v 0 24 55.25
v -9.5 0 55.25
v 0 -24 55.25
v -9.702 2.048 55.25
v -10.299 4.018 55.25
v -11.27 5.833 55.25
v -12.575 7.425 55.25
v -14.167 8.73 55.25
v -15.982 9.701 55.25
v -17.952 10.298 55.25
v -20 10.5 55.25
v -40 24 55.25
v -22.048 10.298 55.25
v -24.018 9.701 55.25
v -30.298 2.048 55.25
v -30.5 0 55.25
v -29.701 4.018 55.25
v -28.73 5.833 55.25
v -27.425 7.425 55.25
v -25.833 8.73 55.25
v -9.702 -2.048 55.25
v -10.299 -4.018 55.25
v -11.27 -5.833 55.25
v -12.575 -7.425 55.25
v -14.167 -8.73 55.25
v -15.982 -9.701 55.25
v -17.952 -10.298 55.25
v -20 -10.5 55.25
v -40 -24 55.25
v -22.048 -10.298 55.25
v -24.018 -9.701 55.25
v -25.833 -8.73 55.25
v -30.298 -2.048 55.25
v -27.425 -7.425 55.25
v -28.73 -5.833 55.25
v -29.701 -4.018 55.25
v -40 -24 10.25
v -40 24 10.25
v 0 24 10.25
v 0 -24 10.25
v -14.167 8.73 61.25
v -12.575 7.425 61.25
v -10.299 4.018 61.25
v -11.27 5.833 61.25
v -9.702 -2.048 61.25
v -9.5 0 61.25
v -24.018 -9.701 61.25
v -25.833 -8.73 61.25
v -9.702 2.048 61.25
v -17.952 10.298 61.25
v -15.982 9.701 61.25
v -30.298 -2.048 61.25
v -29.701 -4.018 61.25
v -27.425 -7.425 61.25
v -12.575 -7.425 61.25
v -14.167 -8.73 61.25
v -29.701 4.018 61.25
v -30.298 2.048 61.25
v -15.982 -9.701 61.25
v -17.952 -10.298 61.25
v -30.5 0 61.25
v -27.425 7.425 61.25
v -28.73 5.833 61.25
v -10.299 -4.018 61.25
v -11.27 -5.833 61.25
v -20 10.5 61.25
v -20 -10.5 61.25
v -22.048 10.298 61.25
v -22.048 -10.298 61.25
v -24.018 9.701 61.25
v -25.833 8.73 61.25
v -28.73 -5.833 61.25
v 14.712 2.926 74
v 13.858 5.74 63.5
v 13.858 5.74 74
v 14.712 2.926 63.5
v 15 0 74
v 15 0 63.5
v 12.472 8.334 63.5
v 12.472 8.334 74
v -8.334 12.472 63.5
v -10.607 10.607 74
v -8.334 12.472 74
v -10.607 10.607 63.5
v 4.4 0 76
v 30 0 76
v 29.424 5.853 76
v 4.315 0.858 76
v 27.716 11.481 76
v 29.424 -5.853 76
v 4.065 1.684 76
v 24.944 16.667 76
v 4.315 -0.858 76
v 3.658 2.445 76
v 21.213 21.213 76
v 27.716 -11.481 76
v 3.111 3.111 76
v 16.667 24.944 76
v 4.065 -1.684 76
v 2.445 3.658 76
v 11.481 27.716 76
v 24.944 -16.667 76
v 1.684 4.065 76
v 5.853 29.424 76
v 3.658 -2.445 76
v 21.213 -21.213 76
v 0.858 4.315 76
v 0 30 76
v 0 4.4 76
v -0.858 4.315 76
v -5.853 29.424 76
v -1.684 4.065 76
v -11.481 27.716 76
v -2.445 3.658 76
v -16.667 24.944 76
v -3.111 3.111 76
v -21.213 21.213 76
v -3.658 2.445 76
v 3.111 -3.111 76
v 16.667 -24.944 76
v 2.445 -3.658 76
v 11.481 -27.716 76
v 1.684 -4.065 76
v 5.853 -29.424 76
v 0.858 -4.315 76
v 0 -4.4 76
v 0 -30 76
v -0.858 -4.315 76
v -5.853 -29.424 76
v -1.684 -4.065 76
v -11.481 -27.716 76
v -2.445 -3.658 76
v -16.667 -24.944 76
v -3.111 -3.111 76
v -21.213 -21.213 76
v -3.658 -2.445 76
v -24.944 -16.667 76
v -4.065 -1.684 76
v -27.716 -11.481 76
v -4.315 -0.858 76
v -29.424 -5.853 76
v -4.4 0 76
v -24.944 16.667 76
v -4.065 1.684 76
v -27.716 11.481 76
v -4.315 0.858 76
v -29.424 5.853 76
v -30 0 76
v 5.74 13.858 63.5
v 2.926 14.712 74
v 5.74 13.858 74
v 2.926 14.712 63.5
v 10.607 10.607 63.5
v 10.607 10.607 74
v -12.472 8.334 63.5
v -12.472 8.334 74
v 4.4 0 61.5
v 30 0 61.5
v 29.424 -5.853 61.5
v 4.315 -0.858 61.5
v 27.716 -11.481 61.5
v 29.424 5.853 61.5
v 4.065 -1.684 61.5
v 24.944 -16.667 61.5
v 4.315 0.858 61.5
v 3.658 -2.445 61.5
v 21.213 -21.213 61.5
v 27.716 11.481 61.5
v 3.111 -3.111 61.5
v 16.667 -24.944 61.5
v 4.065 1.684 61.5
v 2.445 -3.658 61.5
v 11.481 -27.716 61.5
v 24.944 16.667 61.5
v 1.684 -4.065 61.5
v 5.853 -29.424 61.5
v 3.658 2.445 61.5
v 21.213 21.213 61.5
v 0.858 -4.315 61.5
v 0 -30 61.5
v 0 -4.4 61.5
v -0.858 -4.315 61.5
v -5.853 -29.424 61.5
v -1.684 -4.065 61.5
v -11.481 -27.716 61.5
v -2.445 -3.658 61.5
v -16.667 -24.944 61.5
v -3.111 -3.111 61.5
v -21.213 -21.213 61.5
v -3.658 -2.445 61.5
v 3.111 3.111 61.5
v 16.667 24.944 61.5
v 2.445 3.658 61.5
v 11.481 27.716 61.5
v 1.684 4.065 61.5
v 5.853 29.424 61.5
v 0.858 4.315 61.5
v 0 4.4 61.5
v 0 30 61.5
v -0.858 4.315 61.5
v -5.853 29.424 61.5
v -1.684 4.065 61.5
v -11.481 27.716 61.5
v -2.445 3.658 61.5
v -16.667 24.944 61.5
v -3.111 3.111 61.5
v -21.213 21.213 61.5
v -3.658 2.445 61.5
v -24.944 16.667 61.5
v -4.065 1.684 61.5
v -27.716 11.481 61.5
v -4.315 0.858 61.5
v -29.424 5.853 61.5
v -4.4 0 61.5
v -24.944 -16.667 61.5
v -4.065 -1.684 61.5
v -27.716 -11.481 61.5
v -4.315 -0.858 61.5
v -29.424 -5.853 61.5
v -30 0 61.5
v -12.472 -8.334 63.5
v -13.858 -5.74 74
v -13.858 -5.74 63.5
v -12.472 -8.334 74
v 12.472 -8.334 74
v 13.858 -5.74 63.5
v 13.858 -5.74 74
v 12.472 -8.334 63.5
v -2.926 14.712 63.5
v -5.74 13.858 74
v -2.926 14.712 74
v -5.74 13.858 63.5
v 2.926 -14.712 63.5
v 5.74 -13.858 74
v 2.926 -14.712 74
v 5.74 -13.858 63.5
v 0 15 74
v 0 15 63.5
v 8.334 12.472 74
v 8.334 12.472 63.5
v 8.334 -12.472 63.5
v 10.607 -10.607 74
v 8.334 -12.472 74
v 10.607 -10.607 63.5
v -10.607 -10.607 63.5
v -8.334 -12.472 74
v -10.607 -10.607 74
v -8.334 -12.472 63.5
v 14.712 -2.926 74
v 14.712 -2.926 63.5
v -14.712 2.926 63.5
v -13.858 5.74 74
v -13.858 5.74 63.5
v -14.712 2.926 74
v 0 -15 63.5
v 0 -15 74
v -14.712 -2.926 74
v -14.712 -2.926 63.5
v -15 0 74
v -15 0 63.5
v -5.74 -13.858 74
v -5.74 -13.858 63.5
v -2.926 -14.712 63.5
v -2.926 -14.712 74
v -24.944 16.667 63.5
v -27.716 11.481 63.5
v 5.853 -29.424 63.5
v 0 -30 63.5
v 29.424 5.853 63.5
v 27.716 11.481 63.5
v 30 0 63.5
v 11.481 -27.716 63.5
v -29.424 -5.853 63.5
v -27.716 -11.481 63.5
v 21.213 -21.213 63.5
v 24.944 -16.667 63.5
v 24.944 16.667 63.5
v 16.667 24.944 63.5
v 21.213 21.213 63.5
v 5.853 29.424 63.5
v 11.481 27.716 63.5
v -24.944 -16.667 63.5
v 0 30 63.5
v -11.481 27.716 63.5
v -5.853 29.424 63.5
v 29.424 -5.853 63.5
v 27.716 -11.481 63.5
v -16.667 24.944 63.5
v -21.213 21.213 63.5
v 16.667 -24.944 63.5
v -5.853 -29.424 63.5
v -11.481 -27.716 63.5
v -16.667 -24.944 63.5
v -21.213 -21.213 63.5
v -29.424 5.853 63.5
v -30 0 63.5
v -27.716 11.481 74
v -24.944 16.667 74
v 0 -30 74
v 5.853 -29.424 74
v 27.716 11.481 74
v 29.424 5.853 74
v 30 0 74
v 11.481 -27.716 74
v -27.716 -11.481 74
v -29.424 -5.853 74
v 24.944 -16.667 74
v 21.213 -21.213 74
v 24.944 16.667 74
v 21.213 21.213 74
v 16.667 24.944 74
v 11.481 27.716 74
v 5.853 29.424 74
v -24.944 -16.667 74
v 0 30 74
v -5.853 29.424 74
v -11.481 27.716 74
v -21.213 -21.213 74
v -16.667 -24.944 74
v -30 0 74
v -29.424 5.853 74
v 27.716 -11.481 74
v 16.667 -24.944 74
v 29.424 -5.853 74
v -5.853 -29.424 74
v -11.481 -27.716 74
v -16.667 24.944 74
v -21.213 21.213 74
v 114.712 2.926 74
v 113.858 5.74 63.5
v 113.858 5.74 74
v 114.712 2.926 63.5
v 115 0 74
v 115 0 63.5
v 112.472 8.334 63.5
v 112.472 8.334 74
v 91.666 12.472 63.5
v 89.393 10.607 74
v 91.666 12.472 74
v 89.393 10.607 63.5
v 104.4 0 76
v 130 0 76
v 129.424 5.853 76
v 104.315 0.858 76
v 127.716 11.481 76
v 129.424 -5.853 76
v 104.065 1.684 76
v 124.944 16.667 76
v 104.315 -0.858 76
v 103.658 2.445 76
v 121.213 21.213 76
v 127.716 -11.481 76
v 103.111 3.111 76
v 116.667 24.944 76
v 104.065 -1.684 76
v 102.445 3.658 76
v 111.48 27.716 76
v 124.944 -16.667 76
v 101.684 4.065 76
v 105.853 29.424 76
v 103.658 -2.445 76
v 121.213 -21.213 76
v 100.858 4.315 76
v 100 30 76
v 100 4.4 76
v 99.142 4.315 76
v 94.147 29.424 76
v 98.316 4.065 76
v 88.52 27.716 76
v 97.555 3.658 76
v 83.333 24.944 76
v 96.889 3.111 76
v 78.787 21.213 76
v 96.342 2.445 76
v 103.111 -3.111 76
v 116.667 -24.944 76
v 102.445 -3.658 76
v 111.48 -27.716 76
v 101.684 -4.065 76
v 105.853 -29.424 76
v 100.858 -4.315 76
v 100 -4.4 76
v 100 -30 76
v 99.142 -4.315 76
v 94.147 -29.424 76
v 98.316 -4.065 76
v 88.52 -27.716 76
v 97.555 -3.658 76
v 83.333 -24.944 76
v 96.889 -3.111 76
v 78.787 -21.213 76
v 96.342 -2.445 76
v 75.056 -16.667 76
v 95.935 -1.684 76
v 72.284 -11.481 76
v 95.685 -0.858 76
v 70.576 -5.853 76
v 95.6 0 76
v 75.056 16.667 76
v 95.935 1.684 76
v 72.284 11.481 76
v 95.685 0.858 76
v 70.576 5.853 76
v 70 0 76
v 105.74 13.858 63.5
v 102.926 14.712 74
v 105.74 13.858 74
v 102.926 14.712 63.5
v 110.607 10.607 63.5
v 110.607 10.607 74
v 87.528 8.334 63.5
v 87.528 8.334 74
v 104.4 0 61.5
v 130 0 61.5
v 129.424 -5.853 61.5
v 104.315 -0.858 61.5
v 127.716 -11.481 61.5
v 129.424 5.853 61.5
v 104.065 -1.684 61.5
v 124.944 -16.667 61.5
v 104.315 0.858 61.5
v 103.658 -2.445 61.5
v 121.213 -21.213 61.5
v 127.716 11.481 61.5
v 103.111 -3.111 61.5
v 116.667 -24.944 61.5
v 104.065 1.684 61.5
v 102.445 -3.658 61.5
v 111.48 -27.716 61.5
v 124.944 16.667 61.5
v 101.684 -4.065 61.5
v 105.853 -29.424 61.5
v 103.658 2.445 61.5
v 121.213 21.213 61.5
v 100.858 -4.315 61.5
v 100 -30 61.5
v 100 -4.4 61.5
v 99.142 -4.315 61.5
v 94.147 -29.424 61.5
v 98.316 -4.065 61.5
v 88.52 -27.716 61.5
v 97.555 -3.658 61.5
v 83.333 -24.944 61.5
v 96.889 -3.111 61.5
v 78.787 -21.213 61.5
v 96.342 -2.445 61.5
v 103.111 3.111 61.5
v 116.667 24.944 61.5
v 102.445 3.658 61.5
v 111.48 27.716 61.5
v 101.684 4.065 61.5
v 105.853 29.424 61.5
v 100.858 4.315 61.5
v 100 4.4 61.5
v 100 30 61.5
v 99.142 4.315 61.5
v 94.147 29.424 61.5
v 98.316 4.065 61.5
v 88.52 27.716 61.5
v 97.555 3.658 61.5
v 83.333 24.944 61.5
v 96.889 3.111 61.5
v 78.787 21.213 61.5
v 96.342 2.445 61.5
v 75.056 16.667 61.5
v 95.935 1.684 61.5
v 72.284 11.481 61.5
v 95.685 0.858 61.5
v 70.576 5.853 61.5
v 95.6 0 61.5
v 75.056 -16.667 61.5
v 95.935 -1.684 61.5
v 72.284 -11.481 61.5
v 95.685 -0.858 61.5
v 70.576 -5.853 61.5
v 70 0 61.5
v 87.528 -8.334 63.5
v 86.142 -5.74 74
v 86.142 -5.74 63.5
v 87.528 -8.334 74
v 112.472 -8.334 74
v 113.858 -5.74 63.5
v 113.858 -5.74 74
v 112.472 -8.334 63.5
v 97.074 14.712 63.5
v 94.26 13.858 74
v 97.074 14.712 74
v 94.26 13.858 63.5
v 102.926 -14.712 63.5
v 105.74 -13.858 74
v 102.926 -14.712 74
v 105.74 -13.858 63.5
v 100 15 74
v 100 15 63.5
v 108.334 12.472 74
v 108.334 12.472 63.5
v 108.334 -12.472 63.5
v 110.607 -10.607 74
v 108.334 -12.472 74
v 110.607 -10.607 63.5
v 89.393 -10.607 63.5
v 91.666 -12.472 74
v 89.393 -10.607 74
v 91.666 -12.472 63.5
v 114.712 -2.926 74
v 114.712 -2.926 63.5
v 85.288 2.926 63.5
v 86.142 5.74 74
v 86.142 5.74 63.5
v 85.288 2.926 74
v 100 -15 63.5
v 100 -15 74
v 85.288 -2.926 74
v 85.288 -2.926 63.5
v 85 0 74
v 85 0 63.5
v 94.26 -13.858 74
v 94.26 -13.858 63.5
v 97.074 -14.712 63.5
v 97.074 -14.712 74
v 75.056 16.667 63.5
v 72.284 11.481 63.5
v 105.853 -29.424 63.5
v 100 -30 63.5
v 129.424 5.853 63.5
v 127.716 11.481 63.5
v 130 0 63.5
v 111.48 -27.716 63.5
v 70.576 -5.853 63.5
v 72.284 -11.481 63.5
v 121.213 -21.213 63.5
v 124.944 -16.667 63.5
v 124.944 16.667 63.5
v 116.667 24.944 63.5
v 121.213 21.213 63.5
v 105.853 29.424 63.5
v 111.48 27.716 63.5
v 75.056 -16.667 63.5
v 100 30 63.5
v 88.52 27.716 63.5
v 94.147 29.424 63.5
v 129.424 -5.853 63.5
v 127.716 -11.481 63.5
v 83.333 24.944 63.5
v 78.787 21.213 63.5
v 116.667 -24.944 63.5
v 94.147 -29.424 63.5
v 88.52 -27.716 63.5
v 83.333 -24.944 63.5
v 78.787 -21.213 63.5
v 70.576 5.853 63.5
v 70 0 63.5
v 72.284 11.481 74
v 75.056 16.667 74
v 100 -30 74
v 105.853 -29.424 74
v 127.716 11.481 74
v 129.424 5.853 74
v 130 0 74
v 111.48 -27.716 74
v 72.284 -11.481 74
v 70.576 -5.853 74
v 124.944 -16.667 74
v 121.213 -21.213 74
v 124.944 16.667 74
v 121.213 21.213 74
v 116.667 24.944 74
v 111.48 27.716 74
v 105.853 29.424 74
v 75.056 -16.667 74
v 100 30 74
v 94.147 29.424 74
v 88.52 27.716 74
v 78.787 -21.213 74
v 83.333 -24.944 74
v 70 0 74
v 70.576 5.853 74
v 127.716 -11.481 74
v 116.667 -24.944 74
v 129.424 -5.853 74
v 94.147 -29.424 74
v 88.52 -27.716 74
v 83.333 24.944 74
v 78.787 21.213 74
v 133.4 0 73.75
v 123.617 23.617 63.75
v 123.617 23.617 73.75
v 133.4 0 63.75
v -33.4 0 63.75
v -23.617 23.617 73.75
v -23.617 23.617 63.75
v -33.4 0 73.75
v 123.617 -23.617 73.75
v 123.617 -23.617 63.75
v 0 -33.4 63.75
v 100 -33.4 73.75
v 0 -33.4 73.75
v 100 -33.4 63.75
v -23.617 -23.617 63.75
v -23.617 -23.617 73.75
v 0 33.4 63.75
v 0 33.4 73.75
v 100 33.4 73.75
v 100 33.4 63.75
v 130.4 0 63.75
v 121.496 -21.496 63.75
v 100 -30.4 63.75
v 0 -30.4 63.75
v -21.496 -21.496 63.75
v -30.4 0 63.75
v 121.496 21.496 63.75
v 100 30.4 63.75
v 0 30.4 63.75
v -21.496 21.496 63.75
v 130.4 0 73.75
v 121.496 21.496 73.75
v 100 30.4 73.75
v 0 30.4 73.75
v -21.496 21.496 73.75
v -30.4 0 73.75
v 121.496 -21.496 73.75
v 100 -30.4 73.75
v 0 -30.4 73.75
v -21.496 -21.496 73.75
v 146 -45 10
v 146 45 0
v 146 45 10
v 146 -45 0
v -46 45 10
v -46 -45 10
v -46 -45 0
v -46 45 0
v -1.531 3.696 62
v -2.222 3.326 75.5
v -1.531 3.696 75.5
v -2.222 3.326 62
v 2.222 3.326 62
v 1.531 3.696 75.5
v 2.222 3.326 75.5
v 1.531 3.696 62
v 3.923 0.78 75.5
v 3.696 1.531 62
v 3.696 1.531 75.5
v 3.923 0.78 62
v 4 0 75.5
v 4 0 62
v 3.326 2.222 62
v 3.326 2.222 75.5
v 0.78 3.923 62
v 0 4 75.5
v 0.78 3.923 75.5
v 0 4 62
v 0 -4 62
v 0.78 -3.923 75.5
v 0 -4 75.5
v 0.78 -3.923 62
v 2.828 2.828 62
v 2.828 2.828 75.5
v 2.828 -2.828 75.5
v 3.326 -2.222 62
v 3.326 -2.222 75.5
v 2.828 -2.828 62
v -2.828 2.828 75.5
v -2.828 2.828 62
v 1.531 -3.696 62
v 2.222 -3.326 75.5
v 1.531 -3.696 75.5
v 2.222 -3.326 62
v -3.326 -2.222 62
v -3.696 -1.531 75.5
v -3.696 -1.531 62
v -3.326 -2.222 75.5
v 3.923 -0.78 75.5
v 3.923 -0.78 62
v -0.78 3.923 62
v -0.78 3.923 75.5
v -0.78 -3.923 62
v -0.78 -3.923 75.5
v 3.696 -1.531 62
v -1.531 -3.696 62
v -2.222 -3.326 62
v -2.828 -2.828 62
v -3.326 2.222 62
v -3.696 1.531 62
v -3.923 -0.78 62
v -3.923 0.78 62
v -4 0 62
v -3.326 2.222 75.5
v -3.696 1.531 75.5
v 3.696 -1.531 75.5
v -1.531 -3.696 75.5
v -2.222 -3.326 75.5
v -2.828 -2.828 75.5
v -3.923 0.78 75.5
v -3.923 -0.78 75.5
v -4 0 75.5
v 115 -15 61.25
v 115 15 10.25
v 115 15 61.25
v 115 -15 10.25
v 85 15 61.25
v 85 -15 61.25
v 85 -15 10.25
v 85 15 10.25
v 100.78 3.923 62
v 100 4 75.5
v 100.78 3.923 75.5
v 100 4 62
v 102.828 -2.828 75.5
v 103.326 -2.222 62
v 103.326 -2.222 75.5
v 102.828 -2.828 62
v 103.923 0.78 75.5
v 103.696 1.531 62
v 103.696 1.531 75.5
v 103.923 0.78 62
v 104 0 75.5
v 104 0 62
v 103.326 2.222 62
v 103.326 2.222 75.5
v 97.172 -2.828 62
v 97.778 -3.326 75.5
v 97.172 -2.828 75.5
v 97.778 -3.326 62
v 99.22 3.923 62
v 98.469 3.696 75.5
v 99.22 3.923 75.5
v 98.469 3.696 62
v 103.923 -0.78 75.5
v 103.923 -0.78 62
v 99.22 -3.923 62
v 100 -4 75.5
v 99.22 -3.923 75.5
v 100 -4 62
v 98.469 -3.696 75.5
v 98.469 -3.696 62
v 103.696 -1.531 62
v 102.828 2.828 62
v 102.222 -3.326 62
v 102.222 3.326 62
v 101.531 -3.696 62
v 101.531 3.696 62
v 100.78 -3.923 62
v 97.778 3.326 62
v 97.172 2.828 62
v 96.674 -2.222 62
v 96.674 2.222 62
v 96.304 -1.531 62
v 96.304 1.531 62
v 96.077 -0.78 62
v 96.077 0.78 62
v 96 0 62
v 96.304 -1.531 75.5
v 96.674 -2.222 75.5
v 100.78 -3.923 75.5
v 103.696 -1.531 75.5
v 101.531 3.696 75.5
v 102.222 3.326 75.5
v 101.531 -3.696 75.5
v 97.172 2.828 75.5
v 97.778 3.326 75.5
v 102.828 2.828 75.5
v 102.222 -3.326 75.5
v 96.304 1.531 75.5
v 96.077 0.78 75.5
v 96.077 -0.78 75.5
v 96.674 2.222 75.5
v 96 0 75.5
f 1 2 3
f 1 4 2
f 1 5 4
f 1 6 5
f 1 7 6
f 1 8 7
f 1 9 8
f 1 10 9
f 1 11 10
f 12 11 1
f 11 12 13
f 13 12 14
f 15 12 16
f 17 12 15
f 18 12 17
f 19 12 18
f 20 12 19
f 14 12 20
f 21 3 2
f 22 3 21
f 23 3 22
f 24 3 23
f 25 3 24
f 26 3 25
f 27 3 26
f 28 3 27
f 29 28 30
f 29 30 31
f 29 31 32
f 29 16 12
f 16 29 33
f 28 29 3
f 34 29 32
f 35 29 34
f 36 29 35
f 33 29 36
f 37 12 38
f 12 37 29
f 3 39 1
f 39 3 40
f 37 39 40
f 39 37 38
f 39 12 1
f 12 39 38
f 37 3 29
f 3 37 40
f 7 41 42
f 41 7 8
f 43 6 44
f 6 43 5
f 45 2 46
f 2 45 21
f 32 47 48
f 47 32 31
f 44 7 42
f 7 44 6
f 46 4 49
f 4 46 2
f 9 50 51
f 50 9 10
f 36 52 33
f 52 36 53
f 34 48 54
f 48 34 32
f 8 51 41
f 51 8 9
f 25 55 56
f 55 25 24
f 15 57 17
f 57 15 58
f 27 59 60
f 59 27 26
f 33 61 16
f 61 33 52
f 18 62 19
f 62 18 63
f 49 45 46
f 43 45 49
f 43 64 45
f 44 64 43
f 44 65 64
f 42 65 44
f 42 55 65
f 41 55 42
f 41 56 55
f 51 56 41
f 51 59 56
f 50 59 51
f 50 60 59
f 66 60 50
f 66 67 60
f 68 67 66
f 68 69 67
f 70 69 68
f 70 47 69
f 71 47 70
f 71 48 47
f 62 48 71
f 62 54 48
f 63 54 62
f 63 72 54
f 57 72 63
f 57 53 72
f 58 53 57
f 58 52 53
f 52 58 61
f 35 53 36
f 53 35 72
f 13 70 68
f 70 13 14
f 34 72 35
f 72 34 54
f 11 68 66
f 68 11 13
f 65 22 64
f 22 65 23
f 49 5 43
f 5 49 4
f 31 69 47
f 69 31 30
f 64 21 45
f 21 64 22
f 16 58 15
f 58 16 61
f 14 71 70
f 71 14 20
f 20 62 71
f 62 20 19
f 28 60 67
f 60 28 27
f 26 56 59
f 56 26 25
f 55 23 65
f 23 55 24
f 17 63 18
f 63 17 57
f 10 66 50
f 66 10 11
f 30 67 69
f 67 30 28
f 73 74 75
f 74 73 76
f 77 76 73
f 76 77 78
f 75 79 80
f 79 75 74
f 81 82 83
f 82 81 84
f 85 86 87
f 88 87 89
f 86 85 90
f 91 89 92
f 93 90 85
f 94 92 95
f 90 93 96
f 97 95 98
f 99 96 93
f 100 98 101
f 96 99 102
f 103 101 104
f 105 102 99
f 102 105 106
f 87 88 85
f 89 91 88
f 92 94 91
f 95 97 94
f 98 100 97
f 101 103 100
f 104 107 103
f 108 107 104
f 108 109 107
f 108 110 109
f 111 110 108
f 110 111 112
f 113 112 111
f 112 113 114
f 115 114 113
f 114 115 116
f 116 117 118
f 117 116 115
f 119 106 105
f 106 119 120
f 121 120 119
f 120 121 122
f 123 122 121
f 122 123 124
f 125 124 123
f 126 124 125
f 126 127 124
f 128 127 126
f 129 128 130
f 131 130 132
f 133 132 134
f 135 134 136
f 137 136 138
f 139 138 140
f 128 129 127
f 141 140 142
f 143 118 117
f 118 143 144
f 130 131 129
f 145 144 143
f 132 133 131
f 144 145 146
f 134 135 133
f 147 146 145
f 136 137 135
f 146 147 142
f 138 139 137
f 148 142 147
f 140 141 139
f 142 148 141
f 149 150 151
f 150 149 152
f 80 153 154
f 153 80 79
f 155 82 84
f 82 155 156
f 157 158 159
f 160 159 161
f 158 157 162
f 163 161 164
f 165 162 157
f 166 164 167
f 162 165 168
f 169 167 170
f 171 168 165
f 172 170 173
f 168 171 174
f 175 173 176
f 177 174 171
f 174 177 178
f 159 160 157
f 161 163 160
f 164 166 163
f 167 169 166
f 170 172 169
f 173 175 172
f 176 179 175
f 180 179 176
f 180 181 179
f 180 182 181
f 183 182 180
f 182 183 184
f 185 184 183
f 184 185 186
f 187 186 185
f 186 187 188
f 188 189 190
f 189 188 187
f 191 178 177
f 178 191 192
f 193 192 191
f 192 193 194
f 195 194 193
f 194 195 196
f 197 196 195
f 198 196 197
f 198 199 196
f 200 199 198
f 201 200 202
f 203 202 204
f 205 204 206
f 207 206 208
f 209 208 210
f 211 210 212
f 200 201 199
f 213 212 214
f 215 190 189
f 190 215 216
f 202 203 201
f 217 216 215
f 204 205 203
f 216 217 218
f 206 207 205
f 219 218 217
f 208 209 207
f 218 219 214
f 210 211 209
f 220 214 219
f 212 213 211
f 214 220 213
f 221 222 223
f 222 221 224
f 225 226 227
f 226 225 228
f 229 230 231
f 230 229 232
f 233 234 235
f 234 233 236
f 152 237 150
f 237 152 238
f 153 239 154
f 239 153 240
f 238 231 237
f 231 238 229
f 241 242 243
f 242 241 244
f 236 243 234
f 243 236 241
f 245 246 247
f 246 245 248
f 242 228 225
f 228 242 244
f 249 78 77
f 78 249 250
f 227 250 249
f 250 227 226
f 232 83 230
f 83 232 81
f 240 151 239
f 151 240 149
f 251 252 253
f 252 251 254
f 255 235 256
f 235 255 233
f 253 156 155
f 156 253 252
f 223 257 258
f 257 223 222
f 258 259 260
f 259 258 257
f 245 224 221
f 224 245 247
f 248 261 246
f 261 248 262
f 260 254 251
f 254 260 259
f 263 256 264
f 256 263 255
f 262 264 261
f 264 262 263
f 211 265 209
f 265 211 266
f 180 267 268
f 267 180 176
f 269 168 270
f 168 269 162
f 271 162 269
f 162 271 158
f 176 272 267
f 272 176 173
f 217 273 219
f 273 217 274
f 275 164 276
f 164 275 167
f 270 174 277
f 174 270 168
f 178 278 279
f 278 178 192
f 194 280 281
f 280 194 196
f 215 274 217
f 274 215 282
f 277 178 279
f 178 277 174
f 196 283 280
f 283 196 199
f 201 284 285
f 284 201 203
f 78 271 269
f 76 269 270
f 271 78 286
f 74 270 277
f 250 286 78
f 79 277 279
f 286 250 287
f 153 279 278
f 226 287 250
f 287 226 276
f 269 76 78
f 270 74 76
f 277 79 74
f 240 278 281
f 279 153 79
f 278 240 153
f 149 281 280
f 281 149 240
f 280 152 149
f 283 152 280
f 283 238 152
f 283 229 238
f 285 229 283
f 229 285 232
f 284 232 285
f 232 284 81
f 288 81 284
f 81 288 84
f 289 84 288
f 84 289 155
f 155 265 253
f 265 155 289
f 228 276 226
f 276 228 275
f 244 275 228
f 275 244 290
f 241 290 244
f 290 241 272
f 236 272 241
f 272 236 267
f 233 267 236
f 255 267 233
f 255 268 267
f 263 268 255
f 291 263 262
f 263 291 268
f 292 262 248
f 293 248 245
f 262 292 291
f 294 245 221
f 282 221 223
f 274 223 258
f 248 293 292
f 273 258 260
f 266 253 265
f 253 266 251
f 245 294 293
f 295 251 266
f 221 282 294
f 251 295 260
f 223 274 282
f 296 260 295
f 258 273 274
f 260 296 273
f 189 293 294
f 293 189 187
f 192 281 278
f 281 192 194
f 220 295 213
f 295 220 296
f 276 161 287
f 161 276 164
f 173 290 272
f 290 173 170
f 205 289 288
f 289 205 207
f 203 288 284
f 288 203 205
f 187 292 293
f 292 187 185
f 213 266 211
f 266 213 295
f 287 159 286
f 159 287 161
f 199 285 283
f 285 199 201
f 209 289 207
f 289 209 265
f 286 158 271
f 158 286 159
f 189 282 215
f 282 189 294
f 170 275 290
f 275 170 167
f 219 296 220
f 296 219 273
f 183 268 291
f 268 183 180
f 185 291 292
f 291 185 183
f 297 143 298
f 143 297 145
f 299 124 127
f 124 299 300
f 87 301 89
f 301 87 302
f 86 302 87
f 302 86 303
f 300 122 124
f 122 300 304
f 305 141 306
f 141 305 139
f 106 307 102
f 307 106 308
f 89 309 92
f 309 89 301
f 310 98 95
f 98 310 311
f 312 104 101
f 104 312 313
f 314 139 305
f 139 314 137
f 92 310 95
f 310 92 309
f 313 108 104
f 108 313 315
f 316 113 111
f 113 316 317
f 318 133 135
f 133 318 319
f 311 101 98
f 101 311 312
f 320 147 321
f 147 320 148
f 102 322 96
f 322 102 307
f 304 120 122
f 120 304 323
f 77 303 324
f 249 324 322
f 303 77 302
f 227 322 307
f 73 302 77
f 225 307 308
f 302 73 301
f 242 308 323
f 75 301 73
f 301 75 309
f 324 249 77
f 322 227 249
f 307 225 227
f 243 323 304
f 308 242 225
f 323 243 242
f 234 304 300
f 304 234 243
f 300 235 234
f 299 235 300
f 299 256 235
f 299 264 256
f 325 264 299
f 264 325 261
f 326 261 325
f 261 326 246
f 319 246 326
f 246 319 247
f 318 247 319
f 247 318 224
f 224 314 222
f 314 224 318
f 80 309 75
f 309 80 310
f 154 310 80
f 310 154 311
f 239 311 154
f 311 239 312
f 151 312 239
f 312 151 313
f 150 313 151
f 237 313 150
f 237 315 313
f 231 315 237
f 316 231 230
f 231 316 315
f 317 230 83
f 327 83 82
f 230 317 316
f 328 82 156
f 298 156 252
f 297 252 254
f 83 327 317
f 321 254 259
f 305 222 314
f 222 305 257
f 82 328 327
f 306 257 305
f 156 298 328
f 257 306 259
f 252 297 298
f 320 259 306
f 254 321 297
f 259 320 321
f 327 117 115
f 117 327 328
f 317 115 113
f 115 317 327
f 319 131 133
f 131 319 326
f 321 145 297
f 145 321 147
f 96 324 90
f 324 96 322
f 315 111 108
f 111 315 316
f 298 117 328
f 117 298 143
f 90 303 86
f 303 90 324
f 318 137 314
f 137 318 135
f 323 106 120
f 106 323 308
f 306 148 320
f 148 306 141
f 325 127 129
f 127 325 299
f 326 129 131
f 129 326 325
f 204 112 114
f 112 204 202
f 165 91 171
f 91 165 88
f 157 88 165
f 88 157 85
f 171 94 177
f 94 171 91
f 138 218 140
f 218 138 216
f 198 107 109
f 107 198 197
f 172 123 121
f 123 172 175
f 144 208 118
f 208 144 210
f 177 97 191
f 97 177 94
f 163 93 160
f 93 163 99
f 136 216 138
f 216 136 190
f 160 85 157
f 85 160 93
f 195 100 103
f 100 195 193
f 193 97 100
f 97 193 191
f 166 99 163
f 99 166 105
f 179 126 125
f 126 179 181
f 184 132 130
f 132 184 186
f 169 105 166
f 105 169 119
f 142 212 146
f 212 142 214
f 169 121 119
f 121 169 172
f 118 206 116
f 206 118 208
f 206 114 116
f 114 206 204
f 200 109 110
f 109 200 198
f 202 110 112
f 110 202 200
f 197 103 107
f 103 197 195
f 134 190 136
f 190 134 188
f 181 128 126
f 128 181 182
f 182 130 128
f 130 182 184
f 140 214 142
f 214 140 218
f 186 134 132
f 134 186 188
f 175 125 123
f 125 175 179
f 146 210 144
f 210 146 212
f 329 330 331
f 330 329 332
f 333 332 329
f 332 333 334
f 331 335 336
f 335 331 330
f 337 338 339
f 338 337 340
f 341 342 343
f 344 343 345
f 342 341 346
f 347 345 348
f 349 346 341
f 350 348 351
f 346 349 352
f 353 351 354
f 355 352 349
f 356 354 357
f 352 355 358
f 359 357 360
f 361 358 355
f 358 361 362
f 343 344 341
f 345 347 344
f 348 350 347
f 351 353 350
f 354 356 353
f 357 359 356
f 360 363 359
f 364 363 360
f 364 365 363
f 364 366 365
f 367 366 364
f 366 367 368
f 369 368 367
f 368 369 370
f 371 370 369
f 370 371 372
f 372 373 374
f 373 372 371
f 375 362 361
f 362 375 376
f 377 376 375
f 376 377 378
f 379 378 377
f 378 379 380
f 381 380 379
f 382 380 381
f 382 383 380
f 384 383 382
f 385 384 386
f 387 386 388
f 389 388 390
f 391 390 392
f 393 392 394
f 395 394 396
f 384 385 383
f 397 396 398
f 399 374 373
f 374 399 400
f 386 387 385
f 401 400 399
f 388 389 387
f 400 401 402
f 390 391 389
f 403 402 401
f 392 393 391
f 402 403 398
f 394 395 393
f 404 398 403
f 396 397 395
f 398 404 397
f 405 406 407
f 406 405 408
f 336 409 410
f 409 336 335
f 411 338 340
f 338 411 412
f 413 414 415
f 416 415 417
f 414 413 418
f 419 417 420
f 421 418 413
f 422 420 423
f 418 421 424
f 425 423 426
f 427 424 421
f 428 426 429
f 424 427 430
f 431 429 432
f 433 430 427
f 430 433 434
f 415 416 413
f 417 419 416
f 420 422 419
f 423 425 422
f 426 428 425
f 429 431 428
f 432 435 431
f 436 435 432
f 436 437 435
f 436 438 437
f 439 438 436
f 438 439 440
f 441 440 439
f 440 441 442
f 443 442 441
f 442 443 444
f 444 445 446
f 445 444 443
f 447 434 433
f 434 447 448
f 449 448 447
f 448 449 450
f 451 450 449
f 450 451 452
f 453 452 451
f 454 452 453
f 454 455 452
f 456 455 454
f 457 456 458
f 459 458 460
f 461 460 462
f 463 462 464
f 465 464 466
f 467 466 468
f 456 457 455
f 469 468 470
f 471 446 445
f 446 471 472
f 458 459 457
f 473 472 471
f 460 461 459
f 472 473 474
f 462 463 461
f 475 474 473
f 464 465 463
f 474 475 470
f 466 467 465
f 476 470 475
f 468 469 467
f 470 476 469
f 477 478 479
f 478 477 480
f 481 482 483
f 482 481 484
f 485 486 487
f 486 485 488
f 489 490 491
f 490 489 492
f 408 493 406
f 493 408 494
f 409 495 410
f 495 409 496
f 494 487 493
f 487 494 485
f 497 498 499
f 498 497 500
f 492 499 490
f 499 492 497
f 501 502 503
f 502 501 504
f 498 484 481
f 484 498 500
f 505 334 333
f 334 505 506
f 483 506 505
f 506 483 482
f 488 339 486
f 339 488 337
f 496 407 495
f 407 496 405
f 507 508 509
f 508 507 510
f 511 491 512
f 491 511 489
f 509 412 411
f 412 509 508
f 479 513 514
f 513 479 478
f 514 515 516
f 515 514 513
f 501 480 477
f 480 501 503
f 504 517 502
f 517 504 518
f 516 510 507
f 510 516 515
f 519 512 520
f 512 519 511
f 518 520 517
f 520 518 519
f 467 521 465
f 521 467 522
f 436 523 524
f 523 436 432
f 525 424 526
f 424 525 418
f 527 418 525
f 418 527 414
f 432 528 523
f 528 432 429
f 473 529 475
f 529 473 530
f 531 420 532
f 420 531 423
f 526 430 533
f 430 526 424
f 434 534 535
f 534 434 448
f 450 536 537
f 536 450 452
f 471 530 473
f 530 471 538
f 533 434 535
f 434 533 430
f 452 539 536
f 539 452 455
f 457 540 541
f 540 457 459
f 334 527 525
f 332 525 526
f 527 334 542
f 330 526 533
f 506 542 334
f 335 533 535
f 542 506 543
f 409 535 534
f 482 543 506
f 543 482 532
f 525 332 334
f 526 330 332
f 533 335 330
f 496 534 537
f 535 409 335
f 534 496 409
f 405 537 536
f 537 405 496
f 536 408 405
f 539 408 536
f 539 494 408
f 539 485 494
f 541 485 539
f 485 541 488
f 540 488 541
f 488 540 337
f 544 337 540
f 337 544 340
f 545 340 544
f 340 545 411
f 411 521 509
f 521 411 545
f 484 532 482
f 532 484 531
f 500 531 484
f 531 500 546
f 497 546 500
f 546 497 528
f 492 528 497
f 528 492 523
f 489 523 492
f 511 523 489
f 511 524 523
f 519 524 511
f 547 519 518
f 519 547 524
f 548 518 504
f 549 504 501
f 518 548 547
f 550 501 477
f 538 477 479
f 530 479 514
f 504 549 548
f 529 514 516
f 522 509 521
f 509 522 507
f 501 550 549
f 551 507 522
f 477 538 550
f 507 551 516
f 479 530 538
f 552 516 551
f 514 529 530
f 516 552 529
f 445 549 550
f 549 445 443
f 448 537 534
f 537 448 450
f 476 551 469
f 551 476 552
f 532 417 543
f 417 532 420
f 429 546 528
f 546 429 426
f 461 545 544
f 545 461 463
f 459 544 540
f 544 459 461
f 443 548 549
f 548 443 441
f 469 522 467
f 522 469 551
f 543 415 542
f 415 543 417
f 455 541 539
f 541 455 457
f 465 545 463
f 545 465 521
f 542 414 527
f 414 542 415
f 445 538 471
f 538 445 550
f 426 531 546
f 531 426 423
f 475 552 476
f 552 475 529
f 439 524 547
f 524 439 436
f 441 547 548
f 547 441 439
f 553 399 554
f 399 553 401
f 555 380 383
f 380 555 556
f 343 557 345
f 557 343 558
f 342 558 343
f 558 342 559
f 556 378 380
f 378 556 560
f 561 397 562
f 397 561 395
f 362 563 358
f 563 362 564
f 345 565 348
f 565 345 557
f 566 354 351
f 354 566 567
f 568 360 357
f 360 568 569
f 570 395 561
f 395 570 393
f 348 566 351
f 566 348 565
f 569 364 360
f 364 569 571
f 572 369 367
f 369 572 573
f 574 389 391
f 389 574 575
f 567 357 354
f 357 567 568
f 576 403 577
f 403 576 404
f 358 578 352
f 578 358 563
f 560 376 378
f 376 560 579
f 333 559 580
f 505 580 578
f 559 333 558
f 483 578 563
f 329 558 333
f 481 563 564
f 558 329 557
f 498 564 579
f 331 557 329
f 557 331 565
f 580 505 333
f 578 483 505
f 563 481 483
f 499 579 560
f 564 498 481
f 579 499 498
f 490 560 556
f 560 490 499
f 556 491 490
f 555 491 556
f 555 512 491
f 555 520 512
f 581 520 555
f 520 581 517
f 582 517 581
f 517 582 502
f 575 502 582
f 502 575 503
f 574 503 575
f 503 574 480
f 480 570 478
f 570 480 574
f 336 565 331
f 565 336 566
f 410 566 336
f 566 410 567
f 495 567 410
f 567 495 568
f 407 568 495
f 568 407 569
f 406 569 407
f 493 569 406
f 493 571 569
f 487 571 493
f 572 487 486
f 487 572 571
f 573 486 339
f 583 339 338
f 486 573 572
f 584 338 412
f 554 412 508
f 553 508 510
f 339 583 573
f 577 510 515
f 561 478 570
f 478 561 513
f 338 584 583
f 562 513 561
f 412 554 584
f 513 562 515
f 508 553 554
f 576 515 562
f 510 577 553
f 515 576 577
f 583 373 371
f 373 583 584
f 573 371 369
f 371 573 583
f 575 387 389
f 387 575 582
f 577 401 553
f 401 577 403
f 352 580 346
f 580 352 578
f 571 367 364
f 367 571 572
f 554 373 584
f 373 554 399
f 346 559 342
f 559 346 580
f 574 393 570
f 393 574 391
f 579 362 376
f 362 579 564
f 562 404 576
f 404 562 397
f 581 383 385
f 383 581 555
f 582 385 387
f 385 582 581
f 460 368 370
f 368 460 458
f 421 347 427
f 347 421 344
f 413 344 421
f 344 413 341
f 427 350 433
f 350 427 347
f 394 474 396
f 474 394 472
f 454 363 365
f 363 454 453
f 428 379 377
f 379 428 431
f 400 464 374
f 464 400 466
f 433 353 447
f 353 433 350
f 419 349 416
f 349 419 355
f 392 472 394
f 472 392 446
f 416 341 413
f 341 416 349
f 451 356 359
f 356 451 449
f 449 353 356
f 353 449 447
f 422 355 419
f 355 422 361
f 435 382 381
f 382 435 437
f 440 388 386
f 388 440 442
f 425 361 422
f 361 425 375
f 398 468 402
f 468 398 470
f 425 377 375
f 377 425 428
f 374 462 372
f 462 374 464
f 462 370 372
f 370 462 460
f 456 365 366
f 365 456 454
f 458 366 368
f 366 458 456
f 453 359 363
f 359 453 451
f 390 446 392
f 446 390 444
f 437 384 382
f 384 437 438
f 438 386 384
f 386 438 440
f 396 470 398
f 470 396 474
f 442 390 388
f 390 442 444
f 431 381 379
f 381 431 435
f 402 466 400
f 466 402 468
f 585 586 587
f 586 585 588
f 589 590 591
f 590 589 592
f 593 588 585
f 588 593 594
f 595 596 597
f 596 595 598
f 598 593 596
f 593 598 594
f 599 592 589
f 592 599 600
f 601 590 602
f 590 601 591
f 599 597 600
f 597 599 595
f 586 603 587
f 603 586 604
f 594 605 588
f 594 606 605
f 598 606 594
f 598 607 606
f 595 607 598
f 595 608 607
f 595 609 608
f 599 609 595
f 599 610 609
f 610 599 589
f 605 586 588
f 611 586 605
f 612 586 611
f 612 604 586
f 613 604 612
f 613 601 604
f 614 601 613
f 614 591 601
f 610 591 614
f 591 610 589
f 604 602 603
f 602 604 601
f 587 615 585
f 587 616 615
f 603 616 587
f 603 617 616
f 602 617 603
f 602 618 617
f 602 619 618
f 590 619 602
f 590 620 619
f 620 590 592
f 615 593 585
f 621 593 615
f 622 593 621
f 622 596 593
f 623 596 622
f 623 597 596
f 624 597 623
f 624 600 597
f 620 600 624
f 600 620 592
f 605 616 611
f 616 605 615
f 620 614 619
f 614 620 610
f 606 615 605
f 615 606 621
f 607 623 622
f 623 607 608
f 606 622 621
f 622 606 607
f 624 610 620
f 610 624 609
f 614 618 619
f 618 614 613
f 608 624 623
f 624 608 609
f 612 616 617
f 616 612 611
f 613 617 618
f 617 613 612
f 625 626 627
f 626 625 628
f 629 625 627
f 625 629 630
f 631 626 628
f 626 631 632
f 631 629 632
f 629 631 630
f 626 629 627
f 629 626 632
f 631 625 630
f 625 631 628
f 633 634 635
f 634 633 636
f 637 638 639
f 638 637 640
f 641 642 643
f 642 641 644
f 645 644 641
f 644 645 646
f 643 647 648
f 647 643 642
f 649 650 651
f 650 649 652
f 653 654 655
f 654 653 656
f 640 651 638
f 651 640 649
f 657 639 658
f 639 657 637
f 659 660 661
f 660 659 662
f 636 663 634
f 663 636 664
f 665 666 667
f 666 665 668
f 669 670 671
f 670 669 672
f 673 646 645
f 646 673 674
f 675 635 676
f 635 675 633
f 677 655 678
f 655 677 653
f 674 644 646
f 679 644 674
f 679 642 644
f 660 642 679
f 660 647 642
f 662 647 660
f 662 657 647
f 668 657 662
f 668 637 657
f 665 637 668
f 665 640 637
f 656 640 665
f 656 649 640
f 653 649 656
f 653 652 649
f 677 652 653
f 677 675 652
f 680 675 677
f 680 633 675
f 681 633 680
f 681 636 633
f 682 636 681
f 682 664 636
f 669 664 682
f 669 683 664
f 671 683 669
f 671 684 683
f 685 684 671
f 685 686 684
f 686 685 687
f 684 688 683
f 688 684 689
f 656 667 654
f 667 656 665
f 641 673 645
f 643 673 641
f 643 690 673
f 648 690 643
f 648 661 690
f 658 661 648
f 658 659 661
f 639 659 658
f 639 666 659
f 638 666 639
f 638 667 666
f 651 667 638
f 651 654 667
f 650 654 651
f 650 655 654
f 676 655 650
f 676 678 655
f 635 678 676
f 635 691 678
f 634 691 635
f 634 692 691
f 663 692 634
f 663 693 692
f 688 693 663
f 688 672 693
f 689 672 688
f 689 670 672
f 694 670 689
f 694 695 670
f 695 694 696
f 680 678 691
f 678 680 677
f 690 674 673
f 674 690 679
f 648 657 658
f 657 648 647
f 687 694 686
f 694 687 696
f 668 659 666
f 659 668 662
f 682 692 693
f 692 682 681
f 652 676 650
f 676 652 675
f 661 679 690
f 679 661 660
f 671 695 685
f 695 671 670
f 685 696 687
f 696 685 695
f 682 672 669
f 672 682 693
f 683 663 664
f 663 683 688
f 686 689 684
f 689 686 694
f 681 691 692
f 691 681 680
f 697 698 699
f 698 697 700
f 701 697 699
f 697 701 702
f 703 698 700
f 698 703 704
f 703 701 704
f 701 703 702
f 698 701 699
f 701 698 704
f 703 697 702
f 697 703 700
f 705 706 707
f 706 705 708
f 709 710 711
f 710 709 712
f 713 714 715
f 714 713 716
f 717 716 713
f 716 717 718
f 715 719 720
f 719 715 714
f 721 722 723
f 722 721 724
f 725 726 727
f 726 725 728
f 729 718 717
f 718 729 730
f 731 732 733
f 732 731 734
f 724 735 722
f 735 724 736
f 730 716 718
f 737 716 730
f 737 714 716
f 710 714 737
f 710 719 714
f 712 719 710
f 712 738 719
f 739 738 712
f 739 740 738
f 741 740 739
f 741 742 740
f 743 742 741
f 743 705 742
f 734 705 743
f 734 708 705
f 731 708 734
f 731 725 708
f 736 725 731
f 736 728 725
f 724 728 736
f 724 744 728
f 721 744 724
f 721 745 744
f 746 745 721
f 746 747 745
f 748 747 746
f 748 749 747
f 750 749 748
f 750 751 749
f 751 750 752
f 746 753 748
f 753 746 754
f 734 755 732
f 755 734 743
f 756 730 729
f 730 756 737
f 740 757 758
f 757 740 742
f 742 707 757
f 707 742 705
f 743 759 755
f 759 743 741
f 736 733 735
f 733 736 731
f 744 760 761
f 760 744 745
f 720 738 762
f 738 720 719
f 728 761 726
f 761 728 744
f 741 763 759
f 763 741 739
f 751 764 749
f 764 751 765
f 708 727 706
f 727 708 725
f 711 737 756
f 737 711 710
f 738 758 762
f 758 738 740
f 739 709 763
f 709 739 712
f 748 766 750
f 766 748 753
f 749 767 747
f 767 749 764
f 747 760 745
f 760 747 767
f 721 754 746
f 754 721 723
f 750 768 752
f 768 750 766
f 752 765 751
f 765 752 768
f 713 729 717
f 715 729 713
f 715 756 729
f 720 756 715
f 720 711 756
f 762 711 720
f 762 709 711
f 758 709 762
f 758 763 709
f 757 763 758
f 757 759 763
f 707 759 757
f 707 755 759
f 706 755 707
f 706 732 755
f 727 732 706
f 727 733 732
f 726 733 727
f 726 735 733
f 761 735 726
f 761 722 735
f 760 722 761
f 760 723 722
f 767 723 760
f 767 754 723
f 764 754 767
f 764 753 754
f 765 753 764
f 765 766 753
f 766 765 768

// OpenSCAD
$fn = 32;

// ------------------------------------------------------------------------
// Motor belt drive: span 100 mm, pulleys d60, belt 10 mm wide
// Every part is its own module, assembly() places every instance.
// ------------------------------------------------------------------------

// --- part 1 ---
module base_plate() {
  difference() {
    translate([-96, -45, 0]) cube([192, 90, 10]);
  }
}

// --- part 2 ---
module motor() {
  union() {
    translate([-22.5, -24, 0]) cube([45, 48, 40]);
    translate([25.5, 0, 20]) rotate([0, 90, 0]) cylinder(h = 6, d = 21, center = true);
  }
}

// --- part 3 ---
module drive_shaft() {
  translate([0, 0, -6.75]) cylinder(h = 13.5, d = 8);
}

// --- part 4 ---
module pulley_drive() {
  difference() {
    union() {
      cylinder(h = 14.5, d = 30);
      cylinder(h = 2, d = 60);
      translate([0, 0, 12.5]) cylinder(h = 2, d = 60);
    }
    translate([0, 0, -1]) cylinder(h = 16.5, d = 8.8);
  }
}

// --- part 5 ---
module idler_post() {
  translate([-15, -15, 0]) cube([30, 30, 51]);
}

// --- part 6 ---
module driven_shaft() {
  translate([0, 0, -6.75]) cylinder(h = 13.5, d = 8);
}

// --- part 7 ---
module pulley_driven() {
  difference() {
    union() {
      cylinder(h = 14.5, d = 30);
      cylinder(h = 2, d = 60);
      translate([0, 0, 12.5]) cylinder(h = 2, d = 60);
    }
    translate([0, 0, -1]) cylinder(h = 16.5, d = 8.8);
  }
}

// --- part 8 ---
module drive_belt() {
  difference() {
    linear_extrude(height = 10) polygon(points = concat([for (a = [90 : 45 : 270]) [33.4 * cos(a), 33.4 * sin(a)]], [for (a = [270 : 45 : 450]) [100 + 33.4 * cos(a), 33.4 * sin(a)]]));
    translate([0, 0, -1]) linear_extrude(height = 12) polygon(points = concat([for (a = [90 : 45 : 270]) [30.4 * cos(a), 30.4 * sin(a)]], [for (a = [270 : 45 : 450]) [100 + 30.4 * cos(a), 30.4 * sin(a)]]));
  }
}

// --- assembly ---
module assembly() {
  color([0.80, 0.24, 0.20]) translate([50, 0, 0]) rotate([0, 0, 0]) base_plate();
  color([0.20, 0.45, 0.75]) translate([0, 0, 32.75]) rotate([0, 270, 0]) motor();
  color([0.25, 0.62, 0.32]) translate([0, 0, 68.75]) rotate([0, 0, 0]) drive_shaft();
  color([0.92, 0.70, 0.18]) translate([0, 0, 61.5]) rotate([0, 0, 0]) pulley_drive();
  color([0.58, 0.35, 0.70]) translate([100, 0, 10.25]) rotate([0, 0, 0]) idler_post();
  color([0.16, 0.66, 0.66]) translate([100, 0, 68.75]) rotate([0, 0, 0]) driven_shaft();
  color([0.85, 0.48, 0.18]) translate([100, 0, 61.5]) rotate([0, 0, 0]) pulley_driven();
  color([0.55, 0.60, 0.65]) translate([0, 0, 63.75]) rotate([0, 0, 0]) drive_belt();
}

assembly();
